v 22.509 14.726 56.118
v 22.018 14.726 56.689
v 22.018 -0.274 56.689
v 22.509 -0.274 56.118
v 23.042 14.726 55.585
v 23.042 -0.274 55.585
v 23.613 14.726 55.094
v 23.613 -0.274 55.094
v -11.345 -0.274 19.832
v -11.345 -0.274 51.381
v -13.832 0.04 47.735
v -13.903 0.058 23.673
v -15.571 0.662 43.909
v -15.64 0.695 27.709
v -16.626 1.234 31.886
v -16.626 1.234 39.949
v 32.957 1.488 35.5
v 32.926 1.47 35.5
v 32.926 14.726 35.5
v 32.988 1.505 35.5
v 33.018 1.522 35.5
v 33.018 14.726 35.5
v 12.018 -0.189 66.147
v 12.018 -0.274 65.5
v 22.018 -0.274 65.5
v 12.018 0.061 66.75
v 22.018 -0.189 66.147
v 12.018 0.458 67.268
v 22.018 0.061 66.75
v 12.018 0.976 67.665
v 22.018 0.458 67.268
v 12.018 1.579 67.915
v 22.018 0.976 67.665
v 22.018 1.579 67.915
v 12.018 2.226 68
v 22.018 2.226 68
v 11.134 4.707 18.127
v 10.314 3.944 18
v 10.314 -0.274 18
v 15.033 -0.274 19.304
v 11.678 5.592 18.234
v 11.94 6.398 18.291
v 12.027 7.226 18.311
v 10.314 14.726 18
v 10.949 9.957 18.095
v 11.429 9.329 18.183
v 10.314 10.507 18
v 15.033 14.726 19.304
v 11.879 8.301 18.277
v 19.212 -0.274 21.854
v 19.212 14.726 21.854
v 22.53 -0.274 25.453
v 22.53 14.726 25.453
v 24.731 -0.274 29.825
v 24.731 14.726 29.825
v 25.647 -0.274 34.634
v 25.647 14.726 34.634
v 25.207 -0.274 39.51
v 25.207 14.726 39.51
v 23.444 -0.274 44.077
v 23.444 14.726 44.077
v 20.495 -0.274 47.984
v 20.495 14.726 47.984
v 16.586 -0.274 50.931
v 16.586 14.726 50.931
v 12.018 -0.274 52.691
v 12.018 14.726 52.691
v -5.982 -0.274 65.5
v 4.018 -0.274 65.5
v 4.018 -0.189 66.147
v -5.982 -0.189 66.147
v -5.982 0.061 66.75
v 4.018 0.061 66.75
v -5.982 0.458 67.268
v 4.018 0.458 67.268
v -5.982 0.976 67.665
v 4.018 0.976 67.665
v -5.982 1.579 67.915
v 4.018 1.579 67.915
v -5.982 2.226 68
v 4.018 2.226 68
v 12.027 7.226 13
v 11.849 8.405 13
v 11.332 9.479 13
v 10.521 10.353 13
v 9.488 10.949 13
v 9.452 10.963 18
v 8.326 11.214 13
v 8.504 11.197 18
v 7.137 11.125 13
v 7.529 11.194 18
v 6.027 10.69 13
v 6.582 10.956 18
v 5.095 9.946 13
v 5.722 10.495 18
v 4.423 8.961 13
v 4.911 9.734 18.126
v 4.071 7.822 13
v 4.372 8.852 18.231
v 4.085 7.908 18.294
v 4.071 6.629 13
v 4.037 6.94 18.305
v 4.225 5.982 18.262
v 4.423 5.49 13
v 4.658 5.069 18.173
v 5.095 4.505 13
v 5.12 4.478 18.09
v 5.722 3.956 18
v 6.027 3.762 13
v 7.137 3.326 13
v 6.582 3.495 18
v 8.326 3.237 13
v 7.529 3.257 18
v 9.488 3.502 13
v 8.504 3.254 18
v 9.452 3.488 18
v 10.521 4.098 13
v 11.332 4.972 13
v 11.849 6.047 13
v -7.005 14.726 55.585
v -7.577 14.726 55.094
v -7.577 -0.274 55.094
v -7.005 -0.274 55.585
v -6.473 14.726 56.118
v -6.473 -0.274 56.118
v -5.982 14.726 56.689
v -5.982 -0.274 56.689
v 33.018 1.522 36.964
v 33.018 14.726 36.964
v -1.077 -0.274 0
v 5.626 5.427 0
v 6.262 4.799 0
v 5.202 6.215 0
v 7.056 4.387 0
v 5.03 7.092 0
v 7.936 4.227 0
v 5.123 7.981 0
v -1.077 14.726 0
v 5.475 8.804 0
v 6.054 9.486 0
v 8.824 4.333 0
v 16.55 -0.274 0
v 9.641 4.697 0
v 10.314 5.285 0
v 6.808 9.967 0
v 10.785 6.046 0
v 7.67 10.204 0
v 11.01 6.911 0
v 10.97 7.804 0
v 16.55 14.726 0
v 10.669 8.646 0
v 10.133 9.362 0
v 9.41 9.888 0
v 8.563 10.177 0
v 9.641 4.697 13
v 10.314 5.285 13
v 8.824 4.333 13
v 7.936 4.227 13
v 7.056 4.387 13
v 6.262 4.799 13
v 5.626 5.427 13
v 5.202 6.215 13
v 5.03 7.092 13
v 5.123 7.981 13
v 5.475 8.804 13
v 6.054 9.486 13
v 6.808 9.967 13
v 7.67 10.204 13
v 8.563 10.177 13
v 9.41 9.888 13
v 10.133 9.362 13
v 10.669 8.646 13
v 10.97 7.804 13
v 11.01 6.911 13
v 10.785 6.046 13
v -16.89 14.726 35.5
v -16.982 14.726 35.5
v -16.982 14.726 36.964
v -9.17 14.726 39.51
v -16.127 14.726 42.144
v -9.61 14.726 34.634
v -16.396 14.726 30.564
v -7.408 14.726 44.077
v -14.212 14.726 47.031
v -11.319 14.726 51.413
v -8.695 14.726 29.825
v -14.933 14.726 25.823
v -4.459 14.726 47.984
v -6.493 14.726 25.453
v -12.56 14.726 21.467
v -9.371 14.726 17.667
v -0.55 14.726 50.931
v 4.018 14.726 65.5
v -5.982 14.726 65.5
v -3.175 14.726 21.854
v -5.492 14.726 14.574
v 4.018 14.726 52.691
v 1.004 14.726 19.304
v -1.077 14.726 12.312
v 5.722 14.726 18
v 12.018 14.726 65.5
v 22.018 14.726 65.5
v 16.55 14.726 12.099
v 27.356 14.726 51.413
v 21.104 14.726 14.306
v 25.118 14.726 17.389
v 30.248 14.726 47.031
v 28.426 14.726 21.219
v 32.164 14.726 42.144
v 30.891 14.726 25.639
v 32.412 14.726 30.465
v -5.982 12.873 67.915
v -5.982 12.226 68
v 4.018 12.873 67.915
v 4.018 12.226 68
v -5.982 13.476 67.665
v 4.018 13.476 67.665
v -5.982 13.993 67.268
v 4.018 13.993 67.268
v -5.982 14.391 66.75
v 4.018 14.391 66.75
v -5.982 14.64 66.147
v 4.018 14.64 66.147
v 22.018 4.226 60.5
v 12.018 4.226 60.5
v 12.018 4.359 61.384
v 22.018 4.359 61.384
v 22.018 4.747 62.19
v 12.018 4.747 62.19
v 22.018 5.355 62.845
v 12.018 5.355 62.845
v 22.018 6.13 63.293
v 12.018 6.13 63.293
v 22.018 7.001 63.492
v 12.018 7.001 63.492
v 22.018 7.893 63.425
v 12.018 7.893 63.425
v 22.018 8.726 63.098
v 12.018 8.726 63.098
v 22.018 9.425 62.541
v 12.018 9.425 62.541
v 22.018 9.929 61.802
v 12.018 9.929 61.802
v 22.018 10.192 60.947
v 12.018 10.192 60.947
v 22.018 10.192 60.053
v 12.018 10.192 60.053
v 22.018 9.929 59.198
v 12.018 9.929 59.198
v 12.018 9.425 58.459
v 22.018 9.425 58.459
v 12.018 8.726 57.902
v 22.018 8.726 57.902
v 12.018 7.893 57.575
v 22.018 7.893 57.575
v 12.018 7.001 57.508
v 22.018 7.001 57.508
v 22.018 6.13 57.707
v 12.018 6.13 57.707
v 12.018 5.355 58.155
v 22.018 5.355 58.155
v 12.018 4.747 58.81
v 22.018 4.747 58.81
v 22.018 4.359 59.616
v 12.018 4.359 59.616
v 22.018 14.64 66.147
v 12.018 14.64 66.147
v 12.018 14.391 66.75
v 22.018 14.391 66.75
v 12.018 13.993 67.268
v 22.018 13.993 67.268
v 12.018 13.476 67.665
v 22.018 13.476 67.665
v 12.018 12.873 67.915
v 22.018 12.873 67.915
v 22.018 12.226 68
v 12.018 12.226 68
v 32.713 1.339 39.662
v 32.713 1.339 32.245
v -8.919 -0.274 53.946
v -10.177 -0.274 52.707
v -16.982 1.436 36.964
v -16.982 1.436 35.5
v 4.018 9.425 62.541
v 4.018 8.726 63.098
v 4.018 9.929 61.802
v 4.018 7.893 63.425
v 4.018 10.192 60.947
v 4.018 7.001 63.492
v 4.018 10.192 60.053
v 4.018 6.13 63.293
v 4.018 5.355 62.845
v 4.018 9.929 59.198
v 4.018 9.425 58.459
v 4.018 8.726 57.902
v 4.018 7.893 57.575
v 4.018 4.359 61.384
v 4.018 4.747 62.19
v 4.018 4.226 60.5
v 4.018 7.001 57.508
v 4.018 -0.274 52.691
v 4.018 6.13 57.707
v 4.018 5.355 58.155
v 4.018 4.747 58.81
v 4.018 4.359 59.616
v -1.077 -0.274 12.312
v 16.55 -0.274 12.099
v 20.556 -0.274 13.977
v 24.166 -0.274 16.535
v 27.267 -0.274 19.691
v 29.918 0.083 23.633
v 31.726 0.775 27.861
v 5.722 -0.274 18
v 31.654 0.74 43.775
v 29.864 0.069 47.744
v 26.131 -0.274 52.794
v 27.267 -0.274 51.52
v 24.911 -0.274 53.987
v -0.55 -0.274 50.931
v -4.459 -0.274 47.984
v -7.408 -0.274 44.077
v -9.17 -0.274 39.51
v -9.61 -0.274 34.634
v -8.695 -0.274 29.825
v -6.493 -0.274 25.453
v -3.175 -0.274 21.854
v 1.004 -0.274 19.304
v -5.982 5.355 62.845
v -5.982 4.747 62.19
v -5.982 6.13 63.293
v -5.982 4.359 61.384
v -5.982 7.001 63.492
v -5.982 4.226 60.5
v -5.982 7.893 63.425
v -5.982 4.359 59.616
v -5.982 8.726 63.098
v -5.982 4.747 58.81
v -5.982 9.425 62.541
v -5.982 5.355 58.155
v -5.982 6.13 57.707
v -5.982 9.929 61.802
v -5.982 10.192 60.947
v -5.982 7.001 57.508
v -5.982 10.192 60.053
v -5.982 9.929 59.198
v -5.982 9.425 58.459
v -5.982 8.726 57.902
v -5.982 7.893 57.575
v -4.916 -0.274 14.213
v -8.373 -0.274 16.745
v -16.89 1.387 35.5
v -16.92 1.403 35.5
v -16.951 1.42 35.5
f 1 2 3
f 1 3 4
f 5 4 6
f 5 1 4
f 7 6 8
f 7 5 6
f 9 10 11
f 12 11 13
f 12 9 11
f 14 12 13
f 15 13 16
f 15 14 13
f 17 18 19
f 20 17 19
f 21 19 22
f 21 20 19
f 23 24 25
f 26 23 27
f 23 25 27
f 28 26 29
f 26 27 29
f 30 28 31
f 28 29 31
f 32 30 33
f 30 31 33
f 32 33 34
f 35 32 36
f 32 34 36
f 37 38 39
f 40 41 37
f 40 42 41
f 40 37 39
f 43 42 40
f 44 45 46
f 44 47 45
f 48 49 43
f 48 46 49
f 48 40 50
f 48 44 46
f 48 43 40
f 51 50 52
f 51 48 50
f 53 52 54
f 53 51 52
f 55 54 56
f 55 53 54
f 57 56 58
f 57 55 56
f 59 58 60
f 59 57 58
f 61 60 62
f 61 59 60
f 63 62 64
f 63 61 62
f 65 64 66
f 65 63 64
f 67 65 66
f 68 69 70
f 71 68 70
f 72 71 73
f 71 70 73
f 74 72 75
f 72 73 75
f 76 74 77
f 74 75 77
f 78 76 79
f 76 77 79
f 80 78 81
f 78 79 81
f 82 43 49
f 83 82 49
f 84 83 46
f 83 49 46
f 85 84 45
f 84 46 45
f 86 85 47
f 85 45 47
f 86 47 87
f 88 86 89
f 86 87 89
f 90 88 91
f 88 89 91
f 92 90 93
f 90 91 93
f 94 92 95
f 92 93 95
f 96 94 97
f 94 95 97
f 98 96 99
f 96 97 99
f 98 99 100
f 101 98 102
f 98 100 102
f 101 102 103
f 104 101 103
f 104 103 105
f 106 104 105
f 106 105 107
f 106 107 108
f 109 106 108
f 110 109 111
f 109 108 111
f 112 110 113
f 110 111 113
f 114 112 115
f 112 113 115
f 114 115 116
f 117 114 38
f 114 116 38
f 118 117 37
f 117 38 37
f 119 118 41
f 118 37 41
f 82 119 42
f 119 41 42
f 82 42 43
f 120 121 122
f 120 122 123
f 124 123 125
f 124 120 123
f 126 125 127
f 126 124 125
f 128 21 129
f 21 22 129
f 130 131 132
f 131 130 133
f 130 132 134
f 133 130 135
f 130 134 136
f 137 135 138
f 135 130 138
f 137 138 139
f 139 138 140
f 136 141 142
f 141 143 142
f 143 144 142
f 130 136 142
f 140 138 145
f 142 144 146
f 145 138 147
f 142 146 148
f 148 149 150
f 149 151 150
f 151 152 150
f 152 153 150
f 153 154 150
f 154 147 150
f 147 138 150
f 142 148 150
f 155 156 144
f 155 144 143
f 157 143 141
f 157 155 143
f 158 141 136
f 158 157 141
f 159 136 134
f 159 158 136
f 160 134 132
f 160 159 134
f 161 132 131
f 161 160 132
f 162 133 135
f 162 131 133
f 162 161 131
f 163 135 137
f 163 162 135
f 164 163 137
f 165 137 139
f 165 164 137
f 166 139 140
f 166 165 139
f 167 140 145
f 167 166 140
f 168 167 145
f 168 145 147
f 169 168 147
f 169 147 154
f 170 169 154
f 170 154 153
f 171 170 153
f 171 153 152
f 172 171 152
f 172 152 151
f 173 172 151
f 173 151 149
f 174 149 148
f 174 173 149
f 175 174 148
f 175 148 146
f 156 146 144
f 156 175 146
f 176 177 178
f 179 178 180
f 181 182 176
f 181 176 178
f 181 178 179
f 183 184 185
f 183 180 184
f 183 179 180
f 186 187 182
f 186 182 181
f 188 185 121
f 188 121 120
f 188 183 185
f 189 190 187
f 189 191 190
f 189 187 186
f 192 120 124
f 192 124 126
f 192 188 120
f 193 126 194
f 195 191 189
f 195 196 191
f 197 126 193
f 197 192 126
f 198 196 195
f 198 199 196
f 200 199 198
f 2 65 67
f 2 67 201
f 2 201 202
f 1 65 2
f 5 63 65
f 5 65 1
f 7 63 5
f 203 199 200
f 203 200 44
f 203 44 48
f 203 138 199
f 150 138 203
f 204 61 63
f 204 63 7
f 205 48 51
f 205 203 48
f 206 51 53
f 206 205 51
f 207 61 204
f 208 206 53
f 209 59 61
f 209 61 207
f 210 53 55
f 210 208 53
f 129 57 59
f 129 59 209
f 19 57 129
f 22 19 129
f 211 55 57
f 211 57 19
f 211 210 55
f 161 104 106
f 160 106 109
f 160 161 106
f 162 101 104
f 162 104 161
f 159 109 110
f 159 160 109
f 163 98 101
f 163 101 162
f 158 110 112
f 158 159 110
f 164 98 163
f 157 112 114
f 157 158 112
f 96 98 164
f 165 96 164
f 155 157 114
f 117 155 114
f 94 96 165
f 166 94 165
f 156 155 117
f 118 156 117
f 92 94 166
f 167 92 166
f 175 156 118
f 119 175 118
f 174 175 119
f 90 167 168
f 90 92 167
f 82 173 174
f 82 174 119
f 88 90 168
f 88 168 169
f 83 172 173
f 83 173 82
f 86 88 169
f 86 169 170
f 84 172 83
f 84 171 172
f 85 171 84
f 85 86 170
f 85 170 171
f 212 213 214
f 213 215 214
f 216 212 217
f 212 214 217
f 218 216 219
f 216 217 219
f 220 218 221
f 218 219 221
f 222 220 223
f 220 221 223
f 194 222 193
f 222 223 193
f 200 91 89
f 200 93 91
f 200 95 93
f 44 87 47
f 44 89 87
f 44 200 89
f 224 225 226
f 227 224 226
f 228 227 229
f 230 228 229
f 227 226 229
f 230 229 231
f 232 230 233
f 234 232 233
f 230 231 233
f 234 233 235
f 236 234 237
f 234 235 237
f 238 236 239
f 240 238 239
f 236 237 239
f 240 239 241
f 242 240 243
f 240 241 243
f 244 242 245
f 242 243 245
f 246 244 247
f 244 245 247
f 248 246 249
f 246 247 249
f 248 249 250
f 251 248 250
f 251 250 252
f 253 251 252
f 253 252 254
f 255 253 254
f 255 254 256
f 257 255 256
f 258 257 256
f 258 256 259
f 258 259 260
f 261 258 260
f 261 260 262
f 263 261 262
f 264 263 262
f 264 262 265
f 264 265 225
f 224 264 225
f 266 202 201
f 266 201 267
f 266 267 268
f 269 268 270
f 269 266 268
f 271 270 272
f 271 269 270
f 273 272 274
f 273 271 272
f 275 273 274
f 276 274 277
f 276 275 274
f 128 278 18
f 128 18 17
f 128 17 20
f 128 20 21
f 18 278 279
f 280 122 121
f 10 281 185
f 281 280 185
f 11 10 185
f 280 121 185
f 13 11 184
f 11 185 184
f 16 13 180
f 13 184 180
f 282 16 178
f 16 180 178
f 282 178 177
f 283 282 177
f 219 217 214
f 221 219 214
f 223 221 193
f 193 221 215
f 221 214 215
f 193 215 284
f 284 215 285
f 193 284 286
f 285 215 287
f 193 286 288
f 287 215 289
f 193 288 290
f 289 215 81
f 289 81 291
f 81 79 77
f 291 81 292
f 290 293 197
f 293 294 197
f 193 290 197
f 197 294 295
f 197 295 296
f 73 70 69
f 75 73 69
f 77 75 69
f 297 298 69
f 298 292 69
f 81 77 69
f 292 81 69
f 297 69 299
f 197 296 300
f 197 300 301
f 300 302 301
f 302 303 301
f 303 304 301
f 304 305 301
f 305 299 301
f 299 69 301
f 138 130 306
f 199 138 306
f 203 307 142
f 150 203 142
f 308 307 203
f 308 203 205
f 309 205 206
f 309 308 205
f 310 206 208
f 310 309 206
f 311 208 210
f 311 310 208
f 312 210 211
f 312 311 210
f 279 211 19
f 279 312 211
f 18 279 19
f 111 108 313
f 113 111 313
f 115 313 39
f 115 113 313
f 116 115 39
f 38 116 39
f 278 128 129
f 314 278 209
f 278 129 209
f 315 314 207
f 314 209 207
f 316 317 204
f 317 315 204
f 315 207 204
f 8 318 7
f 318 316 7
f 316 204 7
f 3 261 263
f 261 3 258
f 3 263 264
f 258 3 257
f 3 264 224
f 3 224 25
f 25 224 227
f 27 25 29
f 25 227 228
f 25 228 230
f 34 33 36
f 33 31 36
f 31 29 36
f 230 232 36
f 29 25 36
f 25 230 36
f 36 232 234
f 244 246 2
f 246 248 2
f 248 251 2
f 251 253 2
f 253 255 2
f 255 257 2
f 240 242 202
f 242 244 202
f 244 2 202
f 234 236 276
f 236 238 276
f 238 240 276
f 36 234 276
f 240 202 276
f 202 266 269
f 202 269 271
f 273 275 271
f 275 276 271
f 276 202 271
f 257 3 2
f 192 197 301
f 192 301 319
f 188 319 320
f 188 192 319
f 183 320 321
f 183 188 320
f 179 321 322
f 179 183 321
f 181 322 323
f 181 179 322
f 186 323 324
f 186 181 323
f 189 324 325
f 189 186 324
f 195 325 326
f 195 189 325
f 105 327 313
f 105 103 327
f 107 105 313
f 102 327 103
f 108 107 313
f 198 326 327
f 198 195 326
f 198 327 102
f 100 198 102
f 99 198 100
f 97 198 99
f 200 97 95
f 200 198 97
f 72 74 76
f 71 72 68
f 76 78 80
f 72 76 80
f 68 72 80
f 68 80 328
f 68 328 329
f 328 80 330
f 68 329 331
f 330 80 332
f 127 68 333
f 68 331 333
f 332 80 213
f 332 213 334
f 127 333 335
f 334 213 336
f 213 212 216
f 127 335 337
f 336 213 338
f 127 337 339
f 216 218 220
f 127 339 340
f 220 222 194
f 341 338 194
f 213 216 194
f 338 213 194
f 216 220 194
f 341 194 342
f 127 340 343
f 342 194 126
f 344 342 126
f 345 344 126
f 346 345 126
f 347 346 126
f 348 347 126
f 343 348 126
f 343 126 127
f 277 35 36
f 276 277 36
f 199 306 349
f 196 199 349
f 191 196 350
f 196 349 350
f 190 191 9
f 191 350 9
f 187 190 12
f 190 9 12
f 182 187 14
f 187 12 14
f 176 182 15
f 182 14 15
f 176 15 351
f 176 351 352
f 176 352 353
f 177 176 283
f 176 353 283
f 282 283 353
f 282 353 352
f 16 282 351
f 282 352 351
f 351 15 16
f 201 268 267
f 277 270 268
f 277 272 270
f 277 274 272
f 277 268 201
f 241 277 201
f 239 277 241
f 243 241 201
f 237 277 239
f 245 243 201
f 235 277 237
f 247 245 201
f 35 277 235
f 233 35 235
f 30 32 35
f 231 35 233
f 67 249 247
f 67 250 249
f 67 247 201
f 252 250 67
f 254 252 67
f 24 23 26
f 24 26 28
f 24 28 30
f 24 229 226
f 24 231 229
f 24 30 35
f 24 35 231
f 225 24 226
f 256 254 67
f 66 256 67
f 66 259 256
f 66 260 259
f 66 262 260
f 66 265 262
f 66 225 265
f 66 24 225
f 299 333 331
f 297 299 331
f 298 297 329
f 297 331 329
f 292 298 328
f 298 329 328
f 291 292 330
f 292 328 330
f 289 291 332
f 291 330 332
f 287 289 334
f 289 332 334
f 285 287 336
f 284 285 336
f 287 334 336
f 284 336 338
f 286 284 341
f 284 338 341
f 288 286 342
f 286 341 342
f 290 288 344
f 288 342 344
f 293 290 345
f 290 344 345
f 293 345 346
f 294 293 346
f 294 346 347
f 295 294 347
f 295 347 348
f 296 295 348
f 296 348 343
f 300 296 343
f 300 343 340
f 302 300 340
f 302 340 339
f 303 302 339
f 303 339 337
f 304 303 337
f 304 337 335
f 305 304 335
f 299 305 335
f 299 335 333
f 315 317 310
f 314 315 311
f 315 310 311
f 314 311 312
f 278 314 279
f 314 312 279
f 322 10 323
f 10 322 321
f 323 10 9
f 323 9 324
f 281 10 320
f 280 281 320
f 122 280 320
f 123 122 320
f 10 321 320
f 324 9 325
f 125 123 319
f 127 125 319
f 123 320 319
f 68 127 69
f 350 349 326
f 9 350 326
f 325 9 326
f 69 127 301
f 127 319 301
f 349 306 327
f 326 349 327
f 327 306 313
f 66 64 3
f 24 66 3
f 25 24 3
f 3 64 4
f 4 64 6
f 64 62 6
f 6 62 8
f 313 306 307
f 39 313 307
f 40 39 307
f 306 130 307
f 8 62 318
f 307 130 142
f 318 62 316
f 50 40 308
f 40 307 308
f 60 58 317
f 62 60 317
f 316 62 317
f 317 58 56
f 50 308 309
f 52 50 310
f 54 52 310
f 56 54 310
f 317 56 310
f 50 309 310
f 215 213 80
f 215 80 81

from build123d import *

# Parameters (mm, degrees)
SKETCH1_W                = 55
SKETCH1_H                = 40
BOSS_EXTRUDE1_DEPTH      = 18
SKETCH2_W                = 55
SKETCH2_H                = 15
BOSS_EXTRUDE2_DEPTH      = 50
CUT_EXTRUDE1_START       = -15
CUT_EXTRUDE1_DEPTH       = 15
SKETCH4_W                = 8
SKETCH4_H                = 40.233753348
CUT_EXTRUDE2_DEPTH       = 50
SKETCH6_R                = 3
CUT_EXTRUDE3_DEPTH       = 62
FILLET1_R                = 2.5
CUT_EXTRUDE6_DEPTH       = 67.335088131
CUT_EXTRUDE6_DEPTH_BACK  = 67.335088131
CUT_EXTRUDE7_DEPTH       = 61
CUT_EXTRUDE8_DEPTH       = 39
FILLET2_R                = 20
CUT_EXTRUDE9_DEPTH       = 80.705724129
CUT_EXTRUDE9_DEPTH_BACK  = 80.705724129
FILLET4_DEPTH            = 68
FILLET4_2_DEPTH          = 18
FILLET4_START            = -18
FILLET4_3_DEPTH          = 52
CUT_EXTRUDE12_DEPTH      = 19
SKETCH16_W               = 51.141958407
SKETCH16_H               = 24.204184136
CUT_EXTRUDE13_DEPTH      = 19
CUT_EXTRUDE14_DEPTH      = 78.013318614
CUT_EXTRUDE14_DEPTH_BACK = 19
SKETCH17_R               = 3
FILLET6_R                = 10
SKETCH21_R               = 4
CUT_EXTRUDE16_DEPTH      = 7
CUT_EXTRUDE17_DEPTH      = 19
CUT_EXTRUDE18_DEPTH      = 19
FILLET7_R                = 10


with BuildPart() as part:
    # Sketch1 → Boss-Extrude1 (new body)
    with BuildSketch(Plane.XY):
        with Locations((8.018292683, -5.274390244)):
            Rectangle(SKETCH1_W, SKETCH1_H)
    extrude(amount=BOSS_EXTRUDE1_DEPTH)

    # Sketch2 → Boss-Extrude2 (add)
    with BuildSketch(Plane.XY.offset(18)):
        with Locations((8.018292683, 7.225609756)):
            Rectangle(SKETCH2_W, SKETCH2_H)
    extrude(amount=BOSS_EXTRUDE2_DEPTH)

    # Cut-Extrude1: read off the stored shape, not the designer's step
    # Cut-Extrude1 outline → Cut-Extrude1 (cut)
    with BuildSketch(Plane(origin=(0, -0.274390244, 0), x_dir=(-1, 0, 0), z_dir=(0, -1, 0)).offset(CUT_EXTRUDE1_START)):
        with BuildLine():
            ThreePointArc((-10.314485184, -18), (-8.018292683, -53.15), (-5.722100182, -18))
            Line((-5.722100182, -18), (-10.314485184, -18))
        make_face()
    extrude(amount=CUT_EXTRUDE1_DEPTH, mode=Mode.SUBTRACT)

    # Sketch4 → Cut-Extrude2 (cut)
    with BuildSketch(Plane(origin=(0, -0.274390244, 0), x_dir=(-1, 0, 0), z_dir=(0, -1, 0))):
        with Locations((-8.018292683, -53.15)):
            Rectangle(SKETCH4_W, SKETCH4_H)
    extrude(amount=-CUT_EXTRUDE2_DEPTH, mode=Mode.SUBTRACT)

    # Sketch6 → Cut-Extrude3 (cut)
    with BuildSketch(Plane.ZY.offset(19.481707317)):
        with Locations(Location((60.5, 7.225609756, 0), (0, 0, 270))):
            Circle(SKETCH6_R)
    extrude(amount=-CUT_EXTRUDE3_DEPTH, mode=Mode.SUBTRACT)

    # Fillet1
    fillet1_edges = [part.edges().sort_by_distance(p)[0] for p in [
        (35.518292683, -12.774390244, 18),
        (-19.481707317, -12.774390244, 18),
        (-19.481707317, -0.274390244, 43),
        (35.518292683, -0.274390244, 43),
        (-7.731707317, -0.274390244, 68),
        (23.768292683, 14.725609756, 68),
        (8.018292683, -25.274390244, 18),
        (23.768292683, -0.274390244, 68),
        (-7.731707317, 14.725609756, 68),
        (-19.481707317, 14.725609756, 34),
        (35.518292683, 14.725609756, 34),
    ]]
    fillet(fillet1_edges, radius=FILLET1_R)

    # Sketch10 → Cut-Extrude6 (cut, two sides: drawn at the far end of the back side and taken through both)
    with BuildSketch(Plane.XY.offset(18).offset(-CUT_EXTRUDE6_DEPTH_BACK)):
        with BuildLine():
            ThreePointArc((-3.438146554, -22.774390244), (-11.4271438, -17.219826727), (-16.981707317, -9.230829481))
            Line((-16.981707317, -9.230829481), (-16.981707317, -22.774390244))
            Line((-16.981707317, -22.774390244), (-3.438146554, -22.774390244))
        make_face()
        with BuildLine():
            ThreePointArc((-16.981707317, -9.230829481), (-18.849438892, -3.637409944), (-19.481707317, 2.225609756))
            Line((-19.481707317, 2.225609756), (-19.481707317, -25.274390244))
            Line((-19.481707317, -25.274390244), (8.018292683, -25.274390244))
            ThreePointArc((8.018292683, -25.274390244), (2.155272983, -24.642121819), (-3.438146554, -22.774390244))
            Line((-3.438146554, -22.774390244), (-16.981707317, -22.774390244))
            Line((-16.981707317, -22.774390244), (-16.981707317, -9.230829481))
        make_face()
        with BuildLine():
            ThreePointArc((19.47473192, -22.774390244), (13.881312383, -24.642121819), (8.018292683, -25.274390244))
            Line((8.018292683, -25.274390244), (35.518292683, -25.274390244))
            Line((35.518292683, -25.274390244), (35.518292683, 2.225609756))
            ThreePointArc((35.518292683, 2.225609756), (34.886024258, -3.637409944), (33.018292683, -9.230829481))
            Line((33.018292683, -9.230829481), (33.018292683, -22.774390244))
            Line((33.018292683, -22.774390244), (19.47473192, -22.774390244))
        make_face()
        with BuildLine():
            ThreePointArc((33.018292683, -9.230829481), (27.463729166, -17.219826727), (19.47473192, -22.774390244))
            Line((19.47473192, -22.774390244), (33.018292683, -22.774390244))
            Line((33.018292683, -22.774390244), (33.018292683, -9.230829481))
        make_face()
    extrude(amount=CUT_EXTRUDE6_DEPTH + CUT_EXTRUDE6_DEPTH_BACK, mode=Mode.SUBTRACT)

    # Sketch11 → Cut-Extrude7 (cut)
    with BuildSketch(Plane(origin=(0, 14.725609756, 0), x_dir=(1, 0, 0), z_dir=(0, 1, 0))):
        Polygon((-16.981707317, -68), (-16.981707317, 0), (-29.965472326, 0), (-29.965472326, -73.975211298), (-16.981707317, -73.975211298), align=None)
    extrude(amount=-CUT_EXTRUDE7_DEPTH, mode=Mode.SUBTRACT)

    # Sketch12 → Cut-Extrude8 (cut)
    with BuildSketch(Plane(origin=(0, 14.725609756, 0), x_dir=(1, 0, 0), z_dir=(0, 1, 0))):
        Polygon((33.018292683, -34), (33.018292683, -69.603278632), (51.263623859, -69.603278632), (51.263623859, -68), (51.263623859, 5.657942166), (48.966322657, 5.657942166), (33.018292683, 5.657942166), align=None)
    extrude(amount=-CUT_EXTRUDE8_DEPTH, mode=Mode.SUBTRACT)

    # Fillet2
    fillet2_edges = [part.edges().sort_by_distance(p)[0] for p in [
        (-16.981707317, -9.230829481, 9),
        (33.018292683, -9.230829481, 9),
    ]]
    fillet(fillet2_edges, radius=FILLET2_R)

    # Sketch13 → Cut-Extrude9 (cut, two sides: drawn at the far end of the back side and taken through both)
    with BuildSketch(Plane(origin=(0, 0, 0), x_dir=(-1, 0, 0), z_dir=(0, 0, -1)).offset(-CUT_EXTRUDE9_DEPTH_BACK)):
        with BuildLine():
            Line((15.409844247, 2.637038383), (21.378631307, -1.925347001))
            Line((21.378631307, -1.925347001), (18.152736662, -25.695120221))
            Line((18.152736662, -25.695120221), (-4.693551269, -34.090790667))
            Line((-4.693551269, -34.090790667), (-38.816552793, -29.459816409))
            Line((-38.816552793, -29.459816409), (-43.750527307, -6.539564186))
            Line((-43.750527307, -6.539564186), (-31.534000974, 2.637038383))
            ThreePointArc((-31.534000974, 2.637038383), (-29.812131381, -4.006457809), (-26.853089861, -10.198787729))
            ThreePointArc((-26.853089861, -10.198787729), (-8.062078363, -22.773516814), (10.728933135, -10.198787729))
            ThreePointArc((10.728933135, -10.198787729), (13.687974655, -4.006457809), (15.409844247, 2.637038383))
        make_face()
    extrude(amount=CUT_EXTRUDE9_DEPTH + CUT_EXTRUDE9_DEPTH_BACK, mode=Mode.SUBTRACT)

    # Fillet4: read off the stored shape, not the designer's step
    # Fillet4 outline → Fillet4 (add)
    with BuildSketch(Plane.XY):
        with BuildLine():
            ThreePointArc((31.153095191, -0.274390244), (31.967368862, 0.746702465), (33.018292683, 1.52209337))
            Line((33.018292683, 1.52209337), (31.534000974, 2.637038383))
            ThreePointArc((31.534000974, 2.637038383), (31.270593615, 1.175225559), (30.946719887, -0.274390244))
            Line((30.946719887, -0.274390244), (31.153095191, -0.274390244))
        make_face()
        with BuildLine():
            ThreePointArc((-16.981707317, 1.435547188), (-15.921170685, 0.70393524), (-15.08279533, -0.274390244))
            Line((-15.08279533, -0.274390244), (-14.82256316, -0.274390244))
            ThreePointArc((-14.82256316, -0.274390244), (-15.146436888, 1.175225559), (-15.409844247, 2.637038383))
            Line((-15.409844247, 2.637038383), (-16.981707317, 1.435547188))
        make_face()
    extrude(amount=FILLET4_DEPTH)

    # Fillet4 2 outline → Fillet4 2 (add)
    with BuildSketch(Plane.XY):
        with BuildLine():
            ThreePointArc((30.624925491, -1.492895434), (30.848374458, -0.866028928), (31.153095191, -0.274390244))
            Line((31.153095191, -0.274390244), (30.946719887, -0.274390244))
            ThreePointArc((30.946719887, -0.274390244), (30.791189941, -0.885060274), (30.624925491, -1.492895434))
        make_face()
        with BuildLine():
            ThreePointArc((-15.08279533, -0.274390244), (-14.721255817, -0.92925432), (-14.461460233, -1.63072708))
            ThreePointArc((-14.461460233, -1.63072708), (-14.648665519, -0.954330135), (-14.82256316, -0.274390244))
            Line((-14.82256316, -0.274390244), (-15.08279533, -0.274390244))
        make_face()
    extrude(amount=FILLET4_2_DEPTH)

    # Fillet4 3 outline → Fillet4 3 (cut)
    with BuildSketch(Plane.YZ.offset(FILLET4_START)):
        with BuildLine():
            Line((-0.274390244, 68), (-0.274390244, 65.5))
            ThreePointArc((-0.274390244, 65.5), (0.457842803, 67.267766953), (2.225609756, 68))
            Line((2.225609756, 68), (-0.274390244, 68))
        make_face()
    extrude(amount=FILLET4_3_DEPTH, mode=Mode.SUBTRACT)

    # Sketch15 → Cut-Extrude12 (cut)
    with BuildSketch(Plane(origin=(0, 14.725609756, 0), x_dir=(1, 0, 0), z_dir=(0, 1, 0))):
        with BuildLine():
            Line((-17.024514656, -35.5), (-33.27975261, -35.5))
            Line((-33.27975261, -35.5), (-35.19687657, -60.540801199))
            Line((-35.19687657, -60.540801199), (-35.19687657, -93.839402474))
            Line((-35.19687657, -93.839402474), (-5.981707317, -96.076116088))
            Line((-5.981707317, -96.076116088), (-5.981707317, -56.688765002))
            Line((-5.981707317, -56.688765002), (-5.330056918, -56.688765002))
            ThreePointArc((-5.330056918, -56.688765002), (-13.906833847, -47.600868813), (-17.024514656, -35.5))
        make_face()
        with BuildLine():
            Line((22.018292683, -56.688765002), (22.018292683, -96.076116088))
            Line((22.018292683, -96.076116088), (51.233461936, -93.839402474))
            Line((51.233461936, -93.839402474), (51.233461936, -60.540801199))
            Line((51.233461936, -60.540801199), (49.316337976, -35.5))
            Line((49.316337976, -35.5), (33.061100022, -35.5))
            ThreePointArc((33.061100022, -35.5), (29.943419213, -47.600868813), (21.366642284, -56.688765002))
            Line((21.366642284, -56.688765002), (22.018292683, -56.688765002))
        make_face()
    extrude(amount=-CUT_EXTRUDE12_DEPTH, mode=Mode.SUBTRACT)

    # Sketch16 → Cut-Extrude13 (cut)
    with BuildSketch(Plane.XY.offset(18)):
        with Locations((10.488183873, -12.376482312)):
            Rectangle(SKETCH16_W, SKETCH16_H)
    extrude(amount=-CUT_EXTRUDE13_DEPTH, mode=Mode.SUBTRACT)

    # Sketch17 → Cut-Extrude14 (cut, two sides: drawn at the far end of the back side and taken through both)
    with BuildSketch(Plane(origin=(0, 0, 0), x_dir=(-1, 0, 0), z_dir=(0, 0, -1)).offset(-CUT_EXTRUDE14_DEPTH_BACK)):
        with Locations(Location((-8.026721307, 7.225609756, 0), (0, 0, 220.307119111))):
            Circle(SKETCH17_R)
    extrude(amount=CUT_EXTRUDE14_DEPTH + CUT_EXTRUDE14_DEPTH_BACK, mode=Mode.SUBTRACT)

    # Fillet6
    # the kernel refuses this fillet: 10 mm, written as the material it adds along each edge
    with BuildSketch(Plane(origin=(21.366642284, 14.725609756, 56.688765002), x_dir=(0.8155038635718538, 0, -0.5787516293708203), z_dir=(0, -1, 0))) as fillet6_piece_1:
        with BuildLine():
            CenterArc((3.30482204, 9.984862506), FILLET6_R, 253.898496667, 12.94853639)
            Line((0.531423418, 0.37714373), (0, 0))
            ThreePointArc((0, 0), (1.377401598, 0.037908534), (2.754803195, 0))
        make_face()
    extrude(amount=15)
    with BuildSketch(Plane(origin=(-5.330056918, 14.725609756, 56.688765002), x_dir=(-0.8155038635718542, 0, -0.5787516293708195), z_dir=(0, -1, 0))) as fillet6_piece_2:
        with BuildLine():
            CenterArc((3.30482204, -9.984862506), FILLET6_R, 93.152966943, 12.94853639)
            Line((0.531423418, -0.37714373), (0, 0))
            ThreePointArc((0, 0), (1.377401598, -0.037908534), (2.754803195, 0))
        make_face()
    extrude(amount=15)

    # Sketch21 → Cut-Extrude16 (cut)
    with BuildSketch(Plane.XY.offset(20)):
        with Locations((8.026721307, 7.225609756)):
            Circle(SKETCH21_R)
    extrude(amount=-CUT_EXTRUDE16_DEPTH, mode=Mode.SUBTRACT)

    # Sketch22 → Cut-Extrude17 (cut)
    with BuildSketch(Plane(origin=(0, -0.274390244, 0), x_dir=(-1, 0, 0), z_dir=(0, -1, 0))):
        Polygon((-16.550364213, 0), (1.076683558, 0), (1.076683558, -7), (21.110231161, -7), (21.110231161, 7.483175263), (-36.583911817, 7.483175263), (-36.583911817, -7), (-16.550364213, -7), align=None)
    extrude(amount=-CUT_EXTRUDE17_DEPTH, mode=Mode.SUBTRACT)

    # Sketch23 → Cut-Extrude18 (cut)
    with BuildSketch(Plane.XZ.offset(0.274390244)):
        with BuildLine():
            Line((-1.076683558, 7), (-1.076683558, 12.311685022))
            ThreePointArc((-1.076683558, 12.311685022), (-12.560284622, 21.466515028), (-16.88986952, 35.5))
            Line((-16.88986952, 35.5), (-40.344642409, 35.5))
            Line((-40.344642409, 35.5), (-40.344642409, 5.039728318))
            Line((-40.344642409, 5.039728318), (-1.076683558, 7))
        make_face()
        with BuildLine():
            Line((16.550364213, 7), (16.550364213, 12.09871158))
            ThreePointArc((16.550364213, 12.09871158), (28.425825188, 21.218922962), (32.926454886, 35.5))
            Line((32.926454886, 35.5), (56.524951208, 35.5))
            Line((56.524951208, 35.5), (55.518887179, 6.019864159))
            Line((55.518887179, 6.019864159), (16.550364213, 7))
        make_face()
    extrude(amount=-CUT_EXTRUDE18_DEPTH, mode=Mode.SUBTRACT)

    # Fillet7
    fillet7_edges = [part.edges().sort_by_distance(p)[0] for p in [
        (31.153095191, -0.274390244, 35.678703647),
        (-15.08279533, -0.274390244, 35.677150261),
    ]]
    fillet(fillet7_edges, radius=FILLET7_R)


solid = part.part
